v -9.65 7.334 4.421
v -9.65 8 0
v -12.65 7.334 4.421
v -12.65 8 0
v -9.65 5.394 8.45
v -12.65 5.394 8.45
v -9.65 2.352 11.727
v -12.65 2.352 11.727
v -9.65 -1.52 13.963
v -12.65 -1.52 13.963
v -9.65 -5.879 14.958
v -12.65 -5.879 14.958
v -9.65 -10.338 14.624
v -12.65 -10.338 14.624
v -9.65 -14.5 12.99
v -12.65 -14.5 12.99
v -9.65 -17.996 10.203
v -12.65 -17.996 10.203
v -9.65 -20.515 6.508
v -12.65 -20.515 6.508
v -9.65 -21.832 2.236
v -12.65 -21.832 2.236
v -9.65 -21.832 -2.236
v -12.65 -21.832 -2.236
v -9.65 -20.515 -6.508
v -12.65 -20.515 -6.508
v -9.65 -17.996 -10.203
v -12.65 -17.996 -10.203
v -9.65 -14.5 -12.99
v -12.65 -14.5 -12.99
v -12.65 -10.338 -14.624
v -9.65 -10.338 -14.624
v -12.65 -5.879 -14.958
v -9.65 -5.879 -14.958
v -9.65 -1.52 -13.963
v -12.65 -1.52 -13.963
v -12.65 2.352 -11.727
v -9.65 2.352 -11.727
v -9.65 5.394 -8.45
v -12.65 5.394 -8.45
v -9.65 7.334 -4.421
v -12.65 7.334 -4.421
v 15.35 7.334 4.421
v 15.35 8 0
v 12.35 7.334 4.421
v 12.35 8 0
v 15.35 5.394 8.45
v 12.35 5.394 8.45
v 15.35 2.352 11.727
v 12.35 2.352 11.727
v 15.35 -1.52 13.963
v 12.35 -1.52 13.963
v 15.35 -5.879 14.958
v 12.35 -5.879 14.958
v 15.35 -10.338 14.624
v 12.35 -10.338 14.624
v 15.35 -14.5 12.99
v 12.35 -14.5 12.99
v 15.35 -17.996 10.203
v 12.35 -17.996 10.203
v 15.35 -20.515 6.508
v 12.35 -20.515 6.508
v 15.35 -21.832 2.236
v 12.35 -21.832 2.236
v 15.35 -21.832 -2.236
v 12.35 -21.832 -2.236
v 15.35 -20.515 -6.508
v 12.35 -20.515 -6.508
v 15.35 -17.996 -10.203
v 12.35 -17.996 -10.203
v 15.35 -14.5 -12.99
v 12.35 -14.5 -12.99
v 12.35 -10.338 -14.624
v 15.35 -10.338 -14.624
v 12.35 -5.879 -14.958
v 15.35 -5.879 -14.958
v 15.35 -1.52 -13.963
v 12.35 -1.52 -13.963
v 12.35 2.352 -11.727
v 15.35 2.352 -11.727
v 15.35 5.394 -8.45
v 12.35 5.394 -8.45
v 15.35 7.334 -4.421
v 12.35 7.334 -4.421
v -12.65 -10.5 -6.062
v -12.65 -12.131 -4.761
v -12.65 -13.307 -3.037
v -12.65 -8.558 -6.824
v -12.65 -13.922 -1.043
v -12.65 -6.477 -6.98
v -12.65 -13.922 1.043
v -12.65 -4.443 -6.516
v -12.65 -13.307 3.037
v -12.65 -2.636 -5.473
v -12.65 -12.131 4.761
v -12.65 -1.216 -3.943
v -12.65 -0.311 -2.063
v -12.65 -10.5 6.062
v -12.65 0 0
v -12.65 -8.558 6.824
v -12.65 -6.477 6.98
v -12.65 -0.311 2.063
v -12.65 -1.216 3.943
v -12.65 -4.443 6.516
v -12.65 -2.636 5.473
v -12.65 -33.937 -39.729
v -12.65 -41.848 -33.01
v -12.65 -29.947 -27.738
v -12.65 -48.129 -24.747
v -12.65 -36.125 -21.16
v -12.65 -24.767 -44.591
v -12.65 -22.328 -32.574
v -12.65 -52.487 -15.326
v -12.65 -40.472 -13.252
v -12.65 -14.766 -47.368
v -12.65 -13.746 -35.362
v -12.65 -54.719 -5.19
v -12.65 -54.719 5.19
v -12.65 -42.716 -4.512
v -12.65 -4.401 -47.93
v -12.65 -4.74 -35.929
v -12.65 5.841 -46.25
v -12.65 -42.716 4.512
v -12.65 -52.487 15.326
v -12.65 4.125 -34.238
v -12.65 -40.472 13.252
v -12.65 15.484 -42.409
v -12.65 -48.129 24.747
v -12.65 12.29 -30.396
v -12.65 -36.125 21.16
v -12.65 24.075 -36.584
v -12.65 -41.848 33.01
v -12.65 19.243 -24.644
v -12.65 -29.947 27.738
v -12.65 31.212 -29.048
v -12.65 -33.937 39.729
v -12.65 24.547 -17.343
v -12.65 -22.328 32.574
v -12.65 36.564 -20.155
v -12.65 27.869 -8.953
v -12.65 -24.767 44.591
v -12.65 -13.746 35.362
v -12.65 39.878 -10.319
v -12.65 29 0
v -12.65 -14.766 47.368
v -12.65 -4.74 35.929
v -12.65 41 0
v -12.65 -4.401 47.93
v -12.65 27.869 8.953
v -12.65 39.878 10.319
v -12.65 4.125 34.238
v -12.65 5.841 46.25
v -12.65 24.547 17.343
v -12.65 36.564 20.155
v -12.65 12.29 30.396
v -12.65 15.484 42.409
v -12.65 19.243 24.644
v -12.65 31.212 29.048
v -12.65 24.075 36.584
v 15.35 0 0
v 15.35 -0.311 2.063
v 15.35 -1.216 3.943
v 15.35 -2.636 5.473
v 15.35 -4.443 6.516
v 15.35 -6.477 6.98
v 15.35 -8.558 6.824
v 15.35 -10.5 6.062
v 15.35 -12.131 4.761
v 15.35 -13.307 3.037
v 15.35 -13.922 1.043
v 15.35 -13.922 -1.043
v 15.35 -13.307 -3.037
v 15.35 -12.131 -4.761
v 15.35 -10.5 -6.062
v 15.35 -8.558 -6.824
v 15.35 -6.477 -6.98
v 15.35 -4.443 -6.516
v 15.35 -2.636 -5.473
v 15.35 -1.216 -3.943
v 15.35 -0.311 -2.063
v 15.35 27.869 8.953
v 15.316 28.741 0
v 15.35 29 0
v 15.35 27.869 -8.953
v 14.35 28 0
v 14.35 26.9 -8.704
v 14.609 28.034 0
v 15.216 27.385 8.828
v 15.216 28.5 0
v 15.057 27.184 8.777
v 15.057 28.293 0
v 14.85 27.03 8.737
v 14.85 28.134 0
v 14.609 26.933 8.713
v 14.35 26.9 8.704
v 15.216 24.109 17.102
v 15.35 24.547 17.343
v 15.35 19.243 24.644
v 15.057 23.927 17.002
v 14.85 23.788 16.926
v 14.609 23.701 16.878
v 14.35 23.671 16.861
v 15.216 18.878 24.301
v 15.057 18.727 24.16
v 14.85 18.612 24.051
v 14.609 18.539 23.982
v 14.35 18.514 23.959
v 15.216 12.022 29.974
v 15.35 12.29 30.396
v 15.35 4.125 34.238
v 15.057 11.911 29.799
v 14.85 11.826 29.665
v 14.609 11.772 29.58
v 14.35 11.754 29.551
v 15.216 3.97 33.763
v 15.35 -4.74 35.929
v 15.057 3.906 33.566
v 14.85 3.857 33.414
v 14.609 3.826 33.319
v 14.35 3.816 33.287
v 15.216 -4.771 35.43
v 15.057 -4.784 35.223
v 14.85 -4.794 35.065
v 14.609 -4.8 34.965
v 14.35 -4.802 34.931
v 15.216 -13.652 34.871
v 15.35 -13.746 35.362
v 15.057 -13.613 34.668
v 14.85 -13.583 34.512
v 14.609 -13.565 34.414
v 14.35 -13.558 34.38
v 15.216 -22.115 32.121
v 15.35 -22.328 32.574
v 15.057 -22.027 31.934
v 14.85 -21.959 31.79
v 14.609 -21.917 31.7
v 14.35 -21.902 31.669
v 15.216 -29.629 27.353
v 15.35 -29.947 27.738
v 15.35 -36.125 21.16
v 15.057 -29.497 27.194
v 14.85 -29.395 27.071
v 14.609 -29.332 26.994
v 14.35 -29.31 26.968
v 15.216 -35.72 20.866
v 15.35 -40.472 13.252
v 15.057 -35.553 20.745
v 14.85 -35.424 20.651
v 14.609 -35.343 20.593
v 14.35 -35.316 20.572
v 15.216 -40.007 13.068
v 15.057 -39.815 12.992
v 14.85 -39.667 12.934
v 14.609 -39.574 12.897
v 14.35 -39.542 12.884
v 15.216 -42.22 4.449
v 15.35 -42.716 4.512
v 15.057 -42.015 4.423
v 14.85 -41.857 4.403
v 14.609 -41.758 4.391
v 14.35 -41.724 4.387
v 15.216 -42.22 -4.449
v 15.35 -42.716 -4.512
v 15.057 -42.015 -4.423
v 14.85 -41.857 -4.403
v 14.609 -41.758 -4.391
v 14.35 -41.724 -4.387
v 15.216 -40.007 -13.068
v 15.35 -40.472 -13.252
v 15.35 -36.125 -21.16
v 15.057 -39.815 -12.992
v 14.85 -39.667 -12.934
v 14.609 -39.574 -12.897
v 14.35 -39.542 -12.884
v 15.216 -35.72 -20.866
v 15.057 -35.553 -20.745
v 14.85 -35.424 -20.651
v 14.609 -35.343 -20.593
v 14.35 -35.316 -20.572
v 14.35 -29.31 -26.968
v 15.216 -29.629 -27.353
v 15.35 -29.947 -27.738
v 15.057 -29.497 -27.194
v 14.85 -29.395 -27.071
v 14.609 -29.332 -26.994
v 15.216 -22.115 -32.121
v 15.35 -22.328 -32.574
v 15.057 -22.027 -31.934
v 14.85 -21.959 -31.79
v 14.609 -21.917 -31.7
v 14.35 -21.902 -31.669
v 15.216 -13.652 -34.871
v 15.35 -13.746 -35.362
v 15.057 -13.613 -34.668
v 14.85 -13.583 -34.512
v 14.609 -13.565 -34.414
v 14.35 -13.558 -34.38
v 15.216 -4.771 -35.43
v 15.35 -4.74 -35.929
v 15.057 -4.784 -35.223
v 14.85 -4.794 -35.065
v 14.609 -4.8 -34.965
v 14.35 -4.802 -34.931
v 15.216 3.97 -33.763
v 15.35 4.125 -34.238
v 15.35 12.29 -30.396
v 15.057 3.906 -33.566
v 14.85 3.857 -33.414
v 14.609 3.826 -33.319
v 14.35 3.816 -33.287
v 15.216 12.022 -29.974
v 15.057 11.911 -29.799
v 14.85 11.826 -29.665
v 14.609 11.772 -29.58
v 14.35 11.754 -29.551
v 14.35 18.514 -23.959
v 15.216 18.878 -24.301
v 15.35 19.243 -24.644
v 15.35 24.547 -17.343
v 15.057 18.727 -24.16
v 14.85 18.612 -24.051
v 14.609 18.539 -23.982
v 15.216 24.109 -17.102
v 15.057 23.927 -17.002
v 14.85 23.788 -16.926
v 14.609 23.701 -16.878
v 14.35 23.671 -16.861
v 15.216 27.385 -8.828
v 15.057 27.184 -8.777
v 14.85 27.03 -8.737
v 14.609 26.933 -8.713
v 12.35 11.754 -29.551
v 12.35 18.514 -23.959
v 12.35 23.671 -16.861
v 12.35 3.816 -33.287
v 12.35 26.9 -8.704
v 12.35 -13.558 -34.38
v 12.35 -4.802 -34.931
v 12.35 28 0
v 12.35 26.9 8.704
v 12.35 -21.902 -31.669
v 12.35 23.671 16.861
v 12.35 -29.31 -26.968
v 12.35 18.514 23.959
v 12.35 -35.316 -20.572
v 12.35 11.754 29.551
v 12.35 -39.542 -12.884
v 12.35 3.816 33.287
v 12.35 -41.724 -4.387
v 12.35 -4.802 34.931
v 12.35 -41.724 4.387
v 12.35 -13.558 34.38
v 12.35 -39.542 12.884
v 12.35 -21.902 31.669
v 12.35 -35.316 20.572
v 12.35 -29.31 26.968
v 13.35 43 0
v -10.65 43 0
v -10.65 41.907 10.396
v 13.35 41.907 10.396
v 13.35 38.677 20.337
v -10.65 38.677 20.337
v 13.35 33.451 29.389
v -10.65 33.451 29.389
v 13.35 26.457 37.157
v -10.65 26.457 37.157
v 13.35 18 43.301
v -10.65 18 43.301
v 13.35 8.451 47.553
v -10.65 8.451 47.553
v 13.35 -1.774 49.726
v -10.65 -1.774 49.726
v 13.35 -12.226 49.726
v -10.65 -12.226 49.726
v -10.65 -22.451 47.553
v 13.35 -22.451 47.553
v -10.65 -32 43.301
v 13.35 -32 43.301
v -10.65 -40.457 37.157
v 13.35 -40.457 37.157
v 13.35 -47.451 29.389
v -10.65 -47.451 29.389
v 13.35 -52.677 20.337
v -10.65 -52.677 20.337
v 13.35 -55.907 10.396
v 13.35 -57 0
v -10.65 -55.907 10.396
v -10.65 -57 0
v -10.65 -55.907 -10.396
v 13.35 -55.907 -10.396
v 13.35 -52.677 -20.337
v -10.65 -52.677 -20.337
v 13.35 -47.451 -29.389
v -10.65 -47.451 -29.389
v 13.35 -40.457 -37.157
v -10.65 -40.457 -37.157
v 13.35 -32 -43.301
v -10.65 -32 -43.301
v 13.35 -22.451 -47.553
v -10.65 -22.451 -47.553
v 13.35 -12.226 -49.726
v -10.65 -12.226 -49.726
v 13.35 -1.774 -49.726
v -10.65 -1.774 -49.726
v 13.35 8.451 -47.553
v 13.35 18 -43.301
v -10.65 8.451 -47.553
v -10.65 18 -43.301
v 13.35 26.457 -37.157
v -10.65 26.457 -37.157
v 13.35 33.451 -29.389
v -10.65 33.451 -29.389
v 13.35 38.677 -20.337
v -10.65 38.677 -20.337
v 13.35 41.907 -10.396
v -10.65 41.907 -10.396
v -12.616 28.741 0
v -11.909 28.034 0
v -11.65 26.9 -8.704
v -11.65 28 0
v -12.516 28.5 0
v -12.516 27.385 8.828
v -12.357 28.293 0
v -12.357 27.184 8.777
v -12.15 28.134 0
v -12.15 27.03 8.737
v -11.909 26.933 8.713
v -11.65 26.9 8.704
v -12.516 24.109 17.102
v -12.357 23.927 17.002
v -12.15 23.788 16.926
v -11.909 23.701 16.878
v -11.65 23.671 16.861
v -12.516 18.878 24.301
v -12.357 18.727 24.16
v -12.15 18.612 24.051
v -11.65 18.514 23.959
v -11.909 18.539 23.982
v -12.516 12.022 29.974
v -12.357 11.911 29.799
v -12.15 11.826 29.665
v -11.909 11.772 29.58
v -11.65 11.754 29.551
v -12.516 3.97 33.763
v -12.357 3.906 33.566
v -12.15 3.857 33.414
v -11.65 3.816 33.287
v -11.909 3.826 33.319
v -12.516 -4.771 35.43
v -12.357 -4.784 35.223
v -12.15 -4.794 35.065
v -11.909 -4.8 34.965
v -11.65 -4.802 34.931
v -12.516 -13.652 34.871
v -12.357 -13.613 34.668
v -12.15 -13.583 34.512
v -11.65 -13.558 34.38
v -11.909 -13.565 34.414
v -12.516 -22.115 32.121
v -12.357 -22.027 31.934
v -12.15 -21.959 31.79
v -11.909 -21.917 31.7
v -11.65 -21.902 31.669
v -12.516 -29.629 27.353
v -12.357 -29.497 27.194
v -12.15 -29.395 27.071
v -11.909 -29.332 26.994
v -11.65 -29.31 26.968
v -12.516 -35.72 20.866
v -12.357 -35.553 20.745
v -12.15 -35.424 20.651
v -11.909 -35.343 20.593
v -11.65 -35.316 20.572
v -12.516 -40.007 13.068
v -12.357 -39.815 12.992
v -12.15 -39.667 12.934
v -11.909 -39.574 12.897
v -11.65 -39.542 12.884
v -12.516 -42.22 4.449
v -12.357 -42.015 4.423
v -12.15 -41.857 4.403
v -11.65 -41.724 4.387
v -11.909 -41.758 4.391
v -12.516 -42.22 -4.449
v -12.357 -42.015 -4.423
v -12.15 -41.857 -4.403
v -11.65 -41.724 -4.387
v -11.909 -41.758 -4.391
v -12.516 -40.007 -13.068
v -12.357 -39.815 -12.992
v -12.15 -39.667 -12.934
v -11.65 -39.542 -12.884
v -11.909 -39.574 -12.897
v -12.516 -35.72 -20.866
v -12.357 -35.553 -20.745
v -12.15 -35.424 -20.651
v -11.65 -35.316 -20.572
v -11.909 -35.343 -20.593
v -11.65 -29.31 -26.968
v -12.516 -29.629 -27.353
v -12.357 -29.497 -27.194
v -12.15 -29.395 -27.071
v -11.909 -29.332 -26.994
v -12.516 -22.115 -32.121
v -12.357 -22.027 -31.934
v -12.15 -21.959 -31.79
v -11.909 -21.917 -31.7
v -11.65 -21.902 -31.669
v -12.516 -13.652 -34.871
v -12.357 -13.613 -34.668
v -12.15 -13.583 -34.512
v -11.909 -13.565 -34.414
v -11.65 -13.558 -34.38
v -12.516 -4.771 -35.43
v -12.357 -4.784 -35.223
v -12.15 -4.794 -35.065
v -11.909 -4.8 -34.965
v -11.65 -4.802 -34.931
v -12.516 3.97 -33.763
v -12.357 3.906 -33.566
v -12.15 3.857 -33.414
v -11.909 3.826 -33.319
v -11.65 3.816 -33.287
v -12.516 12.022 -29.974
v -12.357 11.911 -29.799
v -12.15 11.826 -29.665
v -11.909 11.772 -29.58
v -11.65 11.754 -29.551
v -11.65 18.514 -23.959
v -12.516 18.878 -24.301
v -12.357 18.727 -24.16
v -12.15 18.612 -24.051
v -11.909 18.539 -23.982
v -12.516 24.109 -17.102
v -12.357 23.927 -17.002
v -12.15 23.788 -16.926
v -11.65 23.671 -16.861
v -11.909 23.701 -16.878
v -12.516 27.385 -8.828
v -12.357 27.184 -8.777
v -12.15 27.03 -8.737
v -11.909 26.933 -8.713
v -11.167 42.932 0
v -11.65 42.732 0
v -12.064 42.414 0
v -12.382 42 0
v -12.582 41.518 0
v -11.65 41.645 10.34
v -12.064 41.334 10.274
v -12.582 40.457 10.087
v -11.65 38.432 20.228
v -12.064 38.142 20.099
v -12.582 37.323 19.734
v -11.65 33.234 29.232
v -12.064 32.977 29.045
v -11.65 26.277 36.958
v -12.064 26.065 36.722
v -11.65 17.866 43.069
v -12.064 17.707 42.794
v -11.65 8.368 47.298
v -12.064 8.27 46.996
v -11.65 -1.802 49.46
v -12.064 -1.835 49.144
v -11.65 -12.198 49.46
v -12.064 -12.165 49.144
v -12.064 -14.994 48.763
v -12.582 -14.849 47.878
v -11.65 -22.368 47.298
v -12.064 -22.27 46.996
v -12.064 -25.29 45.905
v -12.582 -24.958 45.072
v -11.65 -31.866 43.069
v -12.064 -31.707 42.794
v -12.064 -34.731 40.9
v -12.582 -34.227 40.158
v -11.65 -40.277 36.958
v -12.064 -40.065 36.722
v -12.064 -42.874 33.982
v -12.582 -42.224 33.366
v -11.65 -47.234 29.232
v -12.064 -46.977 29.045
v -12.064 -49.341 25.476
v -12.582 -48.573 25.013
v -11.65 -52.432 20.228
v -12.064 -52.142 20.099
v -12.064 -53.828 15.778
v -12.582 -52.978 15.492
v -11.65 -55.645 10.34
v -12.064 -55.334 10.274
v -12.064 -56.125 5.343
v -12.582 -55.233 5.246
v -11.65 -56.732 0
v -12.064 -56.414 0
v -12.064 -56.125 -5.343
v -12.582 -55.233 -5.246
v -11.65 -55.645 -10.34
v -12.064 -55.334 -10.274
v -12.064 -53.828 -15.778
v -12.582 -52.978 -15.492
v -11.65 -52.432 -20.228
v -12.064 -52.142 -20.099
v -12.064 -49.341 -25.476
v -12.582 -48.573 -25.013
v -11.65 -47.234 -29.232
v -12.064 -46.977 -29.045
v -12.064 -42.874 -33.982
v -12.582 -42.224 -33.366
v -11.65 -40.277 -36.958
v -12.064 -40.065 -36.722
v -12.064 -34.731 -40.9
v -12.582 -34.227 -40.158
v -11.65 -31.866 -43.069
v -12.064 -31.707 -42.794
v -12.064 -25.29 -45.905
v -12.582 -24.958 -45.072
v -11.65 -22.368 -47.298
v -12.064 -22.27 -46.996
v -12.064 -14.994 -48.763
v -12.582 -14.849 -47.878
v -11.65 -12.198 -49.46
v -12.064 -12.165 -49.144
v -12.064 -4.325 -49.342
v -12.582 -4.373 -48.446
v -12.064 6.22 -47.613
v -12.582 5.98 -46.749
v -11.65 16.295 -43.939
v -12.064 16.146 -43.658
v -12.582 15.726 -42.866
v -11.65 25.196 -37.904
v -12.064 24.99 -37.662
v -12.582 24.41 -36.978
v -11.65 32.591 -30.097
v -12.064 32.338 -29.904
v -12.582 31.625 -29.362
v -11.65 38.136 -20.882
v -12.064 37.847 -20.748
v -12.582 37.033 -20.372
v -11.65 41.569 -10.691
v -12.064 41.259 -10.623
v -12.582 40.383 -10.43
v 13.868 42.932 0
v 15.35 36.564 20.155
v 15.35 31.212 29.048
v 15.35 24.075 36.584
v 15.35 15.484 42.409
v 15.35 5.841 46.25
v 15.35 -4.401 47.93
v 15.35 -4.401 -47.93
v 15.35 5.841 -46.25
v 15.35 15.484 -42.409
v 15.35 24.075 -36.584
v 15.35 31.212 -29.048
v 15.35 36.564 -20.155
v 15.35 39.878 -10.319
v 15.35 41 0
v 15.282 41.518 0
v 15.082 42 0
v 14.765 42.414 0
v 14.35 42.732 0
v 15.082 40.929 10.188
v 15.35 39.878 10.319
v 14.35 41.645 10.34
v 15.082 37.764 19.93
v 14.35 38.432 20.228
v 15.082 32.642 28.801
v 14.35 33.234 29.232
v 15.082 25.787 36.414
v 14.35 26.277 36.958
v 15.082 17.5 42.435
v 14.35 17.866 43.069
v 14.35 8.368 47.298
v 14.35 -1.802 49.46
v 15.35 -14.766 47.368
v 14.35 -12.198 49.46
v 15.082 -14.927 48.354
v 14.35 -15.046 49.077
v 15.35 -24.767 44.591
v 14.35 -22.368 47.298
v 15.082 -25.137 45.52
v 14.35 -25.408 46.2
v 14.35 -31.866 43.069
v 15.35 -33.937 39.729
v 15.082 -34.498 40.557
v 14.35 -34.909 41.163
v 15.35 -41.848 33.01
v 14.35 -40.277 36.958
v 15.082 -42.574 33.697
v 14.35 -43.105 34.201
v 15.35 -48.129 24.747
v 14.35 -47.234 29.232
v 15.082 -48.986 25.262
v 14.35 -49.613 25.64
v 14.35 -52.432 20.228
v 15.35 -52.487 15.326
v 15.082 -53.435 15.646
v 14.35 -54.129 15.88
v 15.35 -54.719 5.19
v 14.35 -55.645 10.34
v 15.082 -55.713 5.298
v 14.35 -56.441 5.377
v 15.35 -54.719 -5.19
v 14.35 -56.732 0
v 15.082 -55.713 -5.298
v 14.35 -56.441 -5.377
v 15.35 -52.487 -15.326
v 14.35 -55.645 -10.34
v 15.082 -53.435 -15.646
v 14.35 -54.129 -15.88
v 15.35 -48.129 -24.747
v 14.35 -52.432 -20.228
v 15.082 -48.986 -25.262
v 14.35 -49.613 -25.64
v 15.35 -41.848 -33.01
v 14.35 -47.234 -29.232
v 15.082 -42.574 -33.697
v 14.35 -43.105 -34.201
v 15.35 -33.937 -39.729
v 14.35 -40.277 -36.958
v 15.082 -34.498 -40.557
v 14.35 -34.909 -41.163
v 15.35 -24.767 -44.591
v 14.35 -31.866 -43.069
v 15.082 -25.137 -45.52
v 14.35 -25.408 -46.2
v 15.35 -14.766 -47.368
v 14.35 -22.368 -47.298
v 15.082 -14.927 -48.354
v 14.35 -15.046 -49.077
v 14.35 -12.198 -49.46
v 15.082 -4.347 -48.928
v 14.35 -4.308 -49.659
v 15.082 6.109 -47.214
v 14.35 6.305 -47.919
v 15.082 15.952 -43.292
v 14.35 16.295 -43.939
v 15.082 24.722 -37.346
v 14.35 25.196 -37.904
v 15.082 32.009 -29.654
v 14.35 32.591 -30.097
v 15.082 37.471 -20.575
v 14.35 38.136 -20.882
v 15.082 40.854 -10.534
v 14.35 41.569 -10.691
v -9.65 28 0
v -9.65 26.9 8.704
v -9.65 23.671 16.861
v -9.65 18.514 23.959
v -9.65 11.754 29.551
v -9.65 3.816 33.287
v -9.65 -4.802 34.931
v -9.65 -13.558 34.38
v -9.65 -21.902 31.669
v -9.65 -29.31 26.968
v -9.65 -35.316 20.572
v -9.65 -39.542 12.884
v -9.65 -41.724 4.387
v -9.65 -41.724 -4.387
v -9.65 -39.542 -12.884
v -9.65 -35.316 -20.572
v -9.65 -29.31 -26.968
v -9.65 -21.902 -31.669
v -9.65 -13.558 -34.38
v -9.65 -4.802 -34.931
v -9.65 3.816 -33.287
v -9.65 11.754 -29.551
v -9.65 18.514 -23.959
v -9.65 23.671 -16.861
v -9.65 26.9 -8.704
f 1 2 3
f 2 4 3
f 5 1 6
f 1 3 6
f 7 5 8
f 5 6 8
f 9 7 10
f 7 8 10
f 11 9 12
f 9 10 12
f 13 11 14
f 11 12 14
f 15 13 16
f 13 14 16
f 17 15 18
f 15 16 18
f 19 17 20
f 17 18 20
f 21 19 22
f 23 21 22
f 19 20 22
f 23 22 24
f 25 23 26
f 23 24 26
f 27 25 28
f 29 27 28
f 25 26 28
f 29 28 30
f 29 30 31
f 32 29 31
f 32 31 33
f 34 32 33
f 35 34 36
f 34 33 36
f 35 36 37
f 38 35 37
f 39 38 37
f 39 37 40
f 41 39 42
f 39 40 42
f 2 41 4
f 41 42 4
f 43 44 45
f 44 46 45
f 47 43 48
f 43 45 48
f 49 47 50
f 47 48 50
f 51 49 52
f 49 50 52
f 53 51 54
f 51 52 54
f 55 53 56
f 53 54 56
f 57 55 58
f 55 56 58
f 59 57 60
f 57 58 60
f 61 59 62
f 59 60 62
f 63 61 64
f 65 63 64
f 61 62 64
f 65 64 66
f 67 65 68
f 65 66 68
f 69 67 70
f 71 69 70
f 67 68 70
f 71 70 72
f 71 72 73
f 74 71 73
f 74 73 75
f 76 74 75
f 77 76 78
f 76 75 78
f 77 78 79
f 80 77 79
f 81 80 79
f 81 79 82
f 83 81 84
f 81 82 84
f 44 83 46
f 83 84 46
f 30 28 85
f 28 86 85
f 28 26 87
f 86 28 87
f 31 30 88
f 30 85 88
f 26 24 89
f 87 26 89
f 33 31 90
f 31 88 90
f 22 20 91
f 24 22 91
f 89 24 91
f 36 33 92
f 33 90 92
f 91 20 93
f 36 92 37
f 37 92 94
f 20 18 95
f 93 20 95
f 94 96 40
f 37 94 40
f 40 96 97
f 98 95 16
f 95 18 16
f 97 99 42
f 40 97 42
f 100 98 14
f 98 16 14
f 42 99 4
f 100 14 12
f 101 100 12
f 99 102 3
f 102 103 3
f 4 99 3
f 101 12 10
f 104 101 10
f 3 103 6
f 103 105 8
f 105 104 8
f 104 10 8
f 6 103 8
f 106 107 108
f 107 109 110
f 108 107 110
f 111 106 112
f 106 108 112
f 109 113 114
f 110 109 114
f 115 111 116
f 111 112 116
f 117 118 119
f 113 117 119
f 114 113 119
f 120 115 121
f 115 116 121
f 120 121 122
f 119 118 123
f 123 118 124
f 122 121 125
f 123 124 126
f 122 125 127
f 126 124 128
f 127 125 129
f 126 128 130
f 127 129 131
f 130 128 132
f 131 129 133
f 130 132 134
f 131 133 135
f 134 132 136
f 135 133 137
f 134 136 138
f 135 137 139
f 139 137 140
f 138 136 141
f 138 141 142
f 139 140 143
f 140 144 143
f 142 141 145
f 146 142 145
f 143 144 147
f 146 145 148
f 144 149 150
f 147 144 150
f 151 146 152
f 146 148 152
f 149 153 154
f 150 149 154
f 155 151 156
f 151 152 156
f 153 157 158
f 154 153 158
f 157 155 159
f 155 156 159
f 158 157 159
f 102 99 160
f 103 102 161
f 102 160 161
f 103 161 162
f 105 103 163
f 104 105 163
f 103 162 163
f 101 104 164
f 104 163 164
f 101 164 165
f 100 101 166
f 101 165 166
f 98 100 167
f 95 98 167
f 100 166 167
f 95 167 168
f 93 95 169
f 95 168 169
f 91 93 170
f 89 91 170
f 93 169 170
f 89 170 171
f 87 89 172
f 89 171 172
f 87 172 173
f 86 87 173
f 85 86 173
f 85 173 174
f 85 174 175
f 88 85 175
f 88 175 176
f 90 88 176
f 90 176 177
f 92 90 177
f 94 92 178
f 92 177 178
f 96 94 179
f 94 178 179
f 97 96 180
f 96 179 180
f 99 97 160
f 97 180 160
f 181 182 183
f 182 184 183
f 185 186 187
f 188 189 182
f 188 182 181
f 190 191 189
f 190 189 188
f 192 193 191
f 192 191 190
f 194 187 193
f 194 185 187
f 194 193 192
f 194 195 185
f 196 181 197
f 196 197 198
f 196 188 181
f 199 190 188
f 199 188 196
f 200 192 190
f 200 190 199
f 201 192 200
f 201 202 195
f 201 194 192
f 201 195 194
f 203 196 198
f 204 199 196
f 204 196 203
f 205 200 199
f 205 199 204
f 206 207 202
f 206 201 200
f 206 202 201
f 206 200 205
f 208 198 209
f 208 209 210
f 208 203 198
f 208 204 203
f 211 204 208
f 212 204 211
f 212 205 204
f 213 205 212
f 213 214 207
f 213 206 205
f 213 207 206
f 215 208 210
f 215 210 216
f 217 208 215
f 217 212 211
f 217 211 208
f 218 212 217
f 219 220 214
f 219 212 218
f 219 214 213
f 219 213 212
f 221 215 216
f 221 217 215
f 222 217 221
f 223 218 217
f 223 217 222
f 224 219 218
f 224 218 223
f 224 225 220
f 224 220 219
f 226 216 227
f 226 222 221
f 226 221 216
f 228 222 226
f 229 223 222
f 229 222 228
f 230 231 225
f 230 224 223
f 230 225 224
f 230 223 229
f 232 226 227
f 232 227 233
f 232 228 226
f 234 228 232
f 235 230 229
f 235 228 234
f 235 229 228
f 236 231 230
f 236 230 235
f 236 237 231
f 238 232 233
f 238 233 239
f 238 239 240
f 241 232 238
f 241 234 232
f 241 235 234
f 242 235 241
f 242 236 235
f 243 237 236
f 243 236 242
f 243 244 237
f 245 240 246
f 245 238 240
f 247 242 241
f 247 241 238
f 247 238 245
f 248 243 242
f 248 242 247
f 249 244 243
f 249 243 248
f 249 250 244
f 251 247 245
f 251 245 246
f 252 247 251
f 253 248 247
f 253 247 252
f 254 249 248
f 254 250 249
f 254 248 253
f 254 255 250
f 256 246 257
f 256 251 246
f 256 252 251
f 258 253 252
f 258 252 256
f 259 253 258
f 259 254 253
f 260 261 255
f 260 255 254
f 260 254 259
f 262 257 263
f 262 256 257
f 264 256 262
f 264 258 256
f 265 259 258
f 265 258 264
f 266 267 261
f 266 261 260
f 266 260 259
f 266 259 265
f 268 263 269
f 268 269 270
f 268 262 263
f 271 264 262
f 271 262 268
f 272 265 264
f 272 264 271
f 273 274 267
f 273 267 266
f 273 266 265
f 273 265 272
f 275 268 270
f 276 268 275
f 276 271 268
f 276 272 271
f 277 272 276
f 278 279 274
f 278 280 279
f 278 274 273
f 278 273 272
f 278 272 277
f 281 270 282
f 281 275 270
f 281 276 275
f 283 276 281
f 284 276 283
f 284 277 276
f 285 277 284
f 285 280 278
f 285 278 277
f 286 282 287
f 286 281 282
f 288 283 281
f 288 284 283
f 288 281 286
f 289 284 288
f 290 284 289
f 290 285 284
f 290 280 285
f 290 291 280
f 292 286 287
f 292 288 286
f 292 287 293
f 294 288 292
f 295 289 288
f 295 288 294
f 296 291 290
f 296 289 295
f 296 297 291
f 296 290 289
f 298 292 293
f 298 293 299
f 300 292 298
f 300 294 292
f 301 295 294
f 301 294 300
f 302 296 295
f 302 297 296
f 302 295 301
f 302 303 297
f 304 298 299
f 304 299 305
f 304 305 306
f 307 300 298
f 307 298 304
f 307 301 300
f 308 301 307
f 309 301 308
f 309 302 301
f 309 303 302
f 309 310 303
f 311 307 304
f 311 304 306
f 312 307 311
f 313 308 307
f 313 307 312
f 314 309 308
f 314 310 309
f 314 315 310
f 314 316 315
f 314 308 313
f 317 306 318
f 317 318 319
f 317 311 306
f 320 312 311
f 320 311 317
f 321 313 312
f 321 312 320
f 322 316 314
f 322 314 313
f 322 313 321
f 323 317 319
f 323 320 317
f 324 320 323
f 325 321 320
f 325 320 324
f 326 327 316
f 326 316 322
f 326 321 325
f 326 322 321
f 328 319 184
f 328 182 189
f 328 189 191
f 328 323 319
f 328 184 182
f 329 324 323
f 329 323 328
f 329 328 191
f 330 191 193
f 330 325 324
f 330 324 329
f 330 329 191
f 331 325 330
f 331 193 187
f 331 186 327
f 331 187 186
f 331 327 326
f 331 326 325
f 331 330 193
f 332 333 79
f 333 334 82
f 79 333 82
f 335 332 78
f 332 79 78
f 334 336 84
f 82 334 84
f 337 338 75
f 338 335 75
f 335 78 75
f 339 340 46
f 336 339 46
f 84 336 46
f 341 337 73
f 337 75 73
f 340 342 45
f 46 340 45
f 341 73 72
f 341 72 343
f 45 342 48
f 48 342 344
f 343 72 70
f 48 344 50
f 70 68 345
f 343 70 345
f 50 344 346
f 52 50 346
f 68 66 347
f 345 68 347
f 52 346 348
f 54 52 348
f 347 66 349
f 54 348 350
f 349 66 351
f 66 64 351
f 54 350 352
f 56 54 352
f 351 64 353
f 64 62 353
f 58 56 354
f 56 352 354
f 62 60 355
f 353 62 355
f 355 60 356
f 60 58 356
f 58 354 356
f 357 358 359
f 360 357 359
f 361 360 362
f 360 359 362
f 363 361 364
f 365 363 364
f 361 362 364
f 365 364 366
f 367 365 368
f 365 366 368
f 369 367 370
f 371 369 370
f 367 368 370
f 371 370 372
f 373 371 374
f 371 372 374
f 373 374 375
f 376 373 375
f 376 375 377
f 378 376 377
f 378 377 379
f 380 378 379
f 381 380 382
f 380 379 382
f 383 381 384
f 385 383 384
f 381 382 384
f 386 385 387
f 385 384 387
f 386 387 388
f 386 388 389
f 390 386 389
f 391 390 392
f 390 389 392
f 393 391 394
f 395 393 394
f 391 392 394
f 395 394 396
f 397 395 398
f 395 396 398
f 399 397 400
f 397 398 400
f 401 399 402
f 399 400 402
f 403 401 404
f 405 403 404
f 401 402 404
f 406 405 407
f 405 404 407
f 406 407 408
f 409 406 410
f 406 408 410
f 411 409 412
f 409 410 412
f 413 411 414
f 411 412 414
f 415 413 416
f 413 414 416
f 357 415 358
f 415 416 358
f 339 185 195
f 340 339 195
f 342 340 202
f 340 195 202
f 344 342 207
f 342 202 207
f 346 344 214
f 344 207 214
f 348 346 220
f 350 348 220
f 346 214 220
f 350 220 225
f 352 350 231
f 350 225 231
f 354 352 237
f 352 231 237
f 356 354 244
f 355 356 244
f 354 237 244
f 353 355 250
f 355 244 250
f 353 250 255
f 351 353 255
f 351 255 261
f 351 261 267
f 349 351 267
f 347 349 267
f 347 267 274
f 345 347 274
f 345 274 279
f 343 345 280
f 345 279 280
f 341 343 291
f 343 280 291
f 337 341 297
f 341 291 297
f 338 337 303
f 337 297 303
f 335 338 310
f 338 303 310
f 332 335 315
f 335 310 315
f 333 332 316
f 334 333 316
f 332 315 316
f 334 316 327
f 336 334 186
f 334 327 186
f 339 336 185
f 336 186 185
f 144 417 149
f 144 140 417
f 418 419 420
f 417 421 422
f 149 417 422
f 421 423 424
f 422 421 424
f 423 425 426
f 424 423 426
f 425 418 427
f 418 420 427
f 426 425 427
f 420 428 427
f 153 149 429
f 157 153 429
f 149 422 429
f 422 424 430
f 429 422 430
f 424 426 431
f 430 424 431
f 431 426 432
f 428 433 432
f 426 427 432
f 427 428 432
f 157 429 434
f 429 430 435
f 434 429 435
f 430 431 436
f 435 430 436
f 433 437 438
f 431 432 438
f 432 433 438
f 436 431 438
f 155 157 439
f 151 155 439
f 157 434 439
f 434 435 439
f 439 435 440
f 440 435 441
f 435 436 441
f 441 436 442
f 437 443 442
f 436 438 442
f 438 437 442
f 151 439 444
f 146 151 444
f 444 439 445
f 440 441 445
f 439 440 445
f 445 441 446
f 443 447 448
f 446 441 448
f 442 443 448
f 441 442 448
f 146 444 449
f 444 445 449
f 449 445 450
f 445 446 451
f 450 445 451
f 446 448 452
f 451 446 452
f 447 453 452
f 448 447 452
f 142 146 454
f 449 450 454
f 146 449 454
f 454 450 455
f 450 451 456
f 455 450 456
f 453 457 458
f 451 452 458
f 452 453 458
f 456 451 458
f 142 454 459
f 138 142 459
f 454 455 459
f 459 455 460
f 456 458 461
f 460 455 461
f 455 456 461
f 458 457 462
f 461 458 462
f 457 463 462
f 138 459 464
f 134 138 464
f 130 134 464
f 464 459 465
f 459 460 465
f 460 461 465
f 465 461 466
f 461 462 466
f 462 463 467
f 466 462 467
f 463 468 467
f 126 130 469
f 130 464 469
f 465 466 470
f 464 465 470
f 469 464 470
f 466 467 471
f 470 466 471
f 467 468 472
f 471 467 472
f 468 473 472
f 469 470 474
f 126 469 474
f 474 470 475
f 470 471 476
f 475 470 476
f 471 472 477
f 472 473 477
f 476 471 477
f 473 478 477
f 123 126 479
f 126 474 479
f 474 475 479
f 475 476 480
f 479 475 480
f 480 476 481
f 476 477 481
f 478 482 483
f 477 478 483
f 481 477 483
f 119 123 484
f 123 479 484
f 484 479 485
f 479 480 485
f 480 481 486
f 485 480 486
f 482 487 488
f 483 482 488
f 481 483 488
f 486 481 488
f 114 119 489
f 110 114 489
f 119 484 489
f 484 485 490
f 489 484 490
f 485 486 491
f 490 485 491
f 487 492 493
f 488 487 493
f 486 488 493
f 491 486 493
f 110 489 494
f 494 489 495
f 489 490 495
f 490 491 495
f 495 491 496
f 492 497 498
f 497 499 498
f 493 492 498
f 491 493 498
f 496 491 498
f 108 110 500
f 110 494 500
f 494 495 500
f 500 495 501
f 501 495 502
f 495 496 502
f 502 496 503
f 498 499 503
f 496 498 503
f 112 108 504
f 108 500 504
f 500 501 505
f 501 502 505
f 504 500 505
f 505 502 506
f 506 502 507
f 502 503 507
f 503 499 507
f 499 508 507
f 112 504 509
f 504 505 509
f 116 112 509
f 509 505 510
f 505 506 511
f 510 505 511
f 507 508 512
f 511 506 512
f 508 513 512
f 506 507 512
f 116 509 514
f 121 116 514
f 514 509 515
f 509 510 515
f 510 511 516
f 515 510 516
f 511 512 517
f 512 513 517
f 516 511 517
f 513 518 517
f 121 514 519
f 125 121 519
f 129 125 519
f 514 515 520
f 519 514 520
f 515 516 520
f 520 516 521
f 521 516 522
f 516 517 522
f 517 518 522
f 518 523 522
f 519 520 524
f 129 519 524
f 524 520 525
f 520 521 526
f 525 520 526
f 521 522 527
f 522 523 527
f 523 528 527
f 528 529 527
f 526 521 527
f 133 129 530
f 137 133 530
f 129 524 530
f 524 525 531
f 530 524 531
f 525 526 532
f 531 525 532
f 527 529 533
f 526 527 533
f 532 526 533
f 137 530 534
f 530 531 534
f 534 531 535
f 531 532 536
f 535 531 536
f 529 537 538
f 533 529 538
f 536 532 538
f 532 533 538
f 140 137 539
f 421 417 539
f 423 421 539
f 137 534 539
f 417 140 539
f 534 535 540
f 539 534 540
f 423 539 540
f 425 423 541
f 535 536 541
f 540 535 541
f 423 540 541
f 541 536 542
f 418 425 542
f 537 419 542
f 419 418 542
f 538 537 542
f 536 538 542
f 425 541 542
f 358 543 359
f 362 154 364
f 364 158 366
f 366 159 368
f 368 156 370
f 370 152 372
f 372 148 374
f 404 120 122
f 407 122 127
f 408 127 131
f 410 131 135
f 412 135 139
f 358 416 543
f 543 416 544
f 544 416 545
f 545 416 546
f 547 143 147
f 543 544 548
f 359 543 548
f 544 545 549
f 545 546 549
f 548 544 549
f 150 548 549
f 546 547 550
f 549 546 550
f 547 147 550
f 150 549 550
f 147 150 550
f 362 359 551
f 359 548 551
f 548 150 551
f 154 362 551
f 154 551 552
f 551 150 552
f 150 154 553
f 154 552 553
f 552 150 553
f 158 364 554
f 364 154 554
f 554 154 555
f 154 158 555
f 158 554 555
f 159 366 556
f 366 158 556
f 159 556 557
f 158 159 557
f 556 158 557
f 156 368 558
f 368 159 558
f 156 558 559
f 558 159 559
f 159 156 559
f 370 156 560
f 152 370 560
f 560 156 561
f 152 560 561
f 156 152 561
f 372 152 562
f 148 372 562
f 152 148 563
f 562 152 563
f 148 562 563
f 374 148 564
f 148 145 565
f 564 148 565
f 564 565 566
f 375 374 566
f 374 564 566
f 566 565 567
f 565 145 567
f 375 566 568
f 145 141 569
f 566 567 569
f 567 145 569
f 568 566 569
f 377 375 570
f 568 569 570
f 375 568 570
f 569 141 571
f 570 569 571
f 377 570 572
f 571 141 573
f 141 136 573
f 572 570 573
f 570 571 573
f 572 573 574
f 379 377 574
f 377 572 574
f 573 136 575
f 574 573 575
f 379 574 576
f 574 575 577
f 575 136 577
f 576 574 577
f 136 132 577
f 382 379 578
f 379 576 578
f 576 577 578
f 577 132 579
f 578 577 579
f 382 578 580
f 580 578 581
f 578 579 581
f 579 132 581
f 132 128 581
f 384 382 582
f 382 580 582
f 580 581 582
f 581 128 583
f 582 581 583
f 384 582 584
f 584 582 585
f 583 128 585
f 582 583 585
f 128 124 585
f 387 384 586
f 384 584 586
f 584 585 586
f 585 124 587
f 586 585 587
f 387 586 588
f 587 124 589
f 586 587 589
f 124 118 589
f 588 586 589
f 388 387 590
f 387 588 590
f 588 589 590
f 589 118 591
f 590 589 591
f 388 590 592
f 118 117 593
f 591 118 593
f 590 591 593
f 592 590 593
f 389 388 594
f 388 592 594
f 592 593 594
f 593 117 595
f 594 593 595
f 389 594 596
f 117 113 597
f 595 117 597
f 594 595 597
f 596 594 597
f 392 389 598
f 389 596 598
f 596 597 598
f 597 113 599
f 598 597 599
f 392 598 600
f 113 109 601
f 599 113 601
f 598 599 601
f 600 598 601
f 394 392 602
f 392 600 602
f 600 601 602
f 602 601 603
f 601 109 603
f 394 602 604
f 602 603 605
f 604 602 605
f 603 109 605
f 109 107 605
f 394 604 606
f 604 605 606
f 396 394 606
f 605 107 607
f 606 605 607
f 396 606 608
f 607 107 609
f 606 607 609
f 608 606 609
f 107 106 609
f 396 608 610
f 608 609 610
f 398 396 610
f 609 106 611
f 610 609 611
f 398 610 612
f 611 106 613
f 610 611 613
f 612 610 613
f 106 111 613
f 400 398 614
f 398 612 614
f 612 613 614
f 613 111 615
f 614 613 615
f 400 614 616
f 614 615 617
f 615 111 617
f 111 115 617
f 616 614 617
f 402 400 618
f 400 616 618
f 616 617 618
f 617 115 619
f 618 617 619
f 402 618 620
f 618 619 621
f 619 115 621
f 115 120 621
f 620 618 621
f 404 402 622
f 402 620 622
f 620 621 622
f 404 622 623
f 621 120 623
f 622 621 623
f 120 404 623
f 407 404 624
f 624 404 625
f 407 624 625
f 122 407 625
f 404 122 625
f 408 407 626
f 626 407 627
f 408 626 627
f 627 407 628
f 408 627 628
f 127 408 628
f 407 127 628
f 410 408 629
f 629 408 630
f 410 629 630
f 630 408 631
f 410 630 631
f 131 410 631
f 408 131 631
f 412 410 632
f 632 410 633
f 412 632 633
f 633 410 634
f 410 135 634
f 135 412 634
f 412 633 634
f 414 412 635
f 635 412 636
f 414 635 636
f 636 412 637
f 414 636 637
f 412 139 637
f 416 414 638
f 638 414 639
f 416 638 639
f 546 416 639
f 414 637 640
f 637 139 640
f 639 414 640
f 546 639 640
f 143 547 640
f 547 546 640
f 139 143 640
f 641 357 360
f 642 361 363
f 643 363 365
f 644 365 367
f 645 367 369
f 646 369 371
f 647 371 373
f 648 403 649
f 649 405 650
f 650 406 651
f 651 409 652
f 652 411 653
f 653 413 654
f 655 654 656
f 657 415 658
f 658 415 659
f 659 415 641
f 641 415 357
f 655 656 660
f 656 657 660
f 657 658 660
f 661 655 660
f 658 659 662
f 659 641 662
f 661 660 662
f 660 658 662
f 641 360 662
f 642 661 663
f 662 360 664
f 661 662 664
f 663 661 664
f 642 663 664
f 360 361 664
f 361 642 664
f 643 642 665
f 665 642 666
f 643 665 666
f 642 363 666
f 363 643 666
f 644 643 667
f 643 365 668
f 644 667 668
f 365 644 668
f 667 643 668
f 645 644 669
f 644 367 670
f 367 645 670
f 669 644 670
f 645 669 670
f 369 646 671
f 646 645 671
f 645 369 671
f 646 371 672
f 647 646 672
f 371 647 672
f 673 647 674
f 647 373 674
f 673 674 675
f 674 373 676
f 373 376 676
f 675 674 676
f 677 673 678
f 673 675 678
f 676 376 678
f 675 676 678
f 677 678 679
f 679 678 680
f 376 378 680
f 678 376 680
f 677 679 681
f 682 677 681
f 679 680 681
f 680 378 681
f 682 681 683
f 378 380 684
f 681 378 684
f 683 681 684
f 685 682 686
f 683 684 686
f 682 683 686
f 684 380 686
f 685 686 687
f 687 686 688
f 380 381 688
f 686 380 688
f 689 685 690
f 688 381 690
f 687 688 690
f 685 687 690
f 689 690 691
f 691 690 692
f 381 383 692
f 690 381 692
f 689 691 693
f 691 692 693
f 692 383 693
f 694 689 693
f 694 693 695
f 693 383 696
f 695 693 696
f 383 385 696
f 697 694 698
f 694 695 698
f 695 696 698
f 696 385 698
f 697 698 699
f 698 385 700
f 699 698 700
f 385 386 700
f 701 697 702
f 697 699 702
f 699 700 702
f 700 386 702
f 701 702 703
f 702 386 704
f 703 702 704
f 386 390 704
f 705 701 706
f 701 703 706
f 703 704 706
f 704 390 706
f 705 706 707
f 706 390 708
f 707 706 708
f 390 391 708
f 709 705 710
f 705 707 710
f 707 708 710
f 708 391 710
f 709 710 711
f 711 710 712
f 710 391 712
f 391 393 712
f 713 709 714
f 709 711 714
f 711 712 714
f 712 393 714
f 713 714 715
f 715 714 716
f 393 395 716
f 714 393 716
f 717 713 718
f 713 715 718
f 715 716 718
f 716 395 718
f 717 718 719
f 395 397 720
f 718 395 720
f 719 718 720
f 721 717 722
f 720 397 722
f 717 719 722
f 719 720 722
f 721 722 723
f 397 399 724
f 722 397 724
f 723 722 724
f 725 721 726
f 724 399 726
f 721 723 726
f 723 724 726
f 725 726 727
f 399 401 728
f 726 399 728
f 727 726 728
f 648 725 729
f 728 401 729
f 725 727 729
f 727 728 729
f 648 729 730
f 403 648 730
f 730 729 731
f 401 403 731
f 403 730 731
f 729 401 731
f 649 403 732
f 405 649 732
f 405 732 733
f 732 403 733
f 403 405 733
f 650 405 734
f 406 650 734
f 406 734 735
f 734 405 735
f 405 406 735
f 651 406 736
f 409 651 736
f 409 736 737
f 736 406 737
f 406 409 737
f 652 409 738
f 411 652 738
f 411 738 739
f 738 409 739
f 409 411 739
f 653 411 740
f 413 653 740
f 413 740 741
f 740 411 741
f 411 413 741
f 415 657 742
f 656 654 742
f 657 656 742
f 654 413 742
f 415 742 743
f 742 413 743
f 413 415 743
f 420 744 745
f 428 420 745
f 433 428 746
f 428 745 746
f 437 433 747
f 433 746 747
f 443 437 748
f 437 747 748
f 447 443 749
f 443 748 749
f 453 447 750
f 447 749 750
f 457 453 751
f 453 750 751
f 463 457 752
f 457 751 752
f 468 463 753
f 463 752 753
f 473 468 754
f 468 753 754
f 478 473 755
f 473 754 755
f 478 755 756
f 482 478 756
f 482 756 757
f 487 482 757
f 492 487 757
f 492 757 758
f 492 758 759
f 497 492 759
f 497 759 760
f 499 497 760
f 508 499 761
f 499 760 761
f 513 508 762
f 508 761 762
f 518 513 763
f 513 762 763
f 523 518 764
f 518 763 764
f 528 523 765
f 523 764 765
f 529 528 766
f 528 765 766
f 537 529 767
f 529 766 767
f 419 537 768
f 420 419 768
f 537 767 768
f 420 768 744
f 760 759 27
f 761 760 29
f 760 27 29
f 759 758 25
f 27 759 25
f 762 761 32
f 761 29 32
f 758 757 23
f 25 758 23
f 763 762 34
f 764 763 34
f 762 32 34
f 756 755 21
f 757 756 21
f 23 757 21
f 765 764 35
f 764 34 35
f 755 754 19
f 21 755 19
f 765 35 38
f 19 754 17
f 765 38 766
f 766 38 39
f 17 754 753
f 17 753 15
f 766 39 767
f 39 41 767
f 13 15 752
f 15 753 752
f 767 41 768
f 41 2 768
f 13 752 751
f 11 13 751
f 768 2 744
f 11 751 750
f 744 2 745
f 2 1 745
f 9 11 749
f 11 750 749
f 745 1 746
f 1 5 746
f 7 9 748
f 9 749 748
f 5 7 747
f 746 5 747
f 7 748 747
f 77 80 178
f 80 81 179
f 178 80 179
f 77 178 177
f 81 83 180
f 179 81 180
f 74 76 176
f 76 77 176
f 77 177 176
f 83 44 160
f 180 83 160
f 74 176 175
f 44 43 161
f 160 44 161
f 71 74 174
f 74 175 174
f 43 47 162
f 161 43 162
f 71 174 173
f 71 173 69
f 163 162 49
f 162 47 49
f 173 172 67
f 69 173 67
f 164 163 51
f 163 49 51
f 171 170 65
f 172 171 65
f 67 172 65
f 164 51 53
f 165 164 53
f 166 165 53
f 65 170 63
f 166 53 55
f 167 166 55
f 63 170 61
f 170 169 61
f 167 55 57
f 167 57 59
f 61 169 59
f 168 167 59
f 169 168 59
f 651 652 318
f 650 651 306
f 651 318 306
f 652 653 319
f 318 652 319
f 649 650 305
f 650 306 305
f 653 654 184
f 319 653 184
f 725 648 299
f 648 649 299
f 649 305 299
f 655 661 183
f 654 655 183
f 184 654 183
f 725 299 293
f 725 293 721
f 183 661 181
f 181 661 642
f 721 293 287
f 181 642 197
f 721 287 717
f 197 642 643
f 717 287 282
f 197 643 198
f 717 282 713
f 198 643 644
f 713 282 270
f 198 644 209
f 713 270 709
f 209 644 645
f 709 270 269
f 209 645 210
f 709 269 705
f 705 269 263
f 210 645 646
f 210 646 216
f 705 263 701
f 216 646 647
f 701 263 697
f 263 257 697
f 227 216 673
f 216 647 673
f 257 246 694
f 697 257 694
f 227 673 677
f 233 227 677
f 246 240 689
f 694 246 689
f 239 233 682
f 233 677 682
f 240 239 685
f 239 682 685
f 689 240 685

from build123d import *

# Parameters (mm, degrees)
REDONDEO1_R = 2
REDONDEO2_R = 2
REDONDEO3_R = 1
REDONDEO4_R = 1


with BuildPart() as part:
    # Croquis1 → Revolución1 (revolve)
    with BuildSketch(Plane.XY):
        Polygon((-12.649708752, 0), (15.350291248, 0), (15.350291248, 8), (12.350291248, 8), (12.350291248, 28), (15.350291248, 28), (15.350291248, 43), (-12.649708752, 43), (-12.649708752, 28), (-9.649708752, 28), (-9.649708752, 8), (-12.649708752, 8), align=None)
    revolve(axis=Axis((-30.163665743, -7, 0), (1, 0, 0)))

    # Redondeo1
    redondeo1_edges = [part.edges().sort_by_distance(p)[0] for p in [
        (15.350291248, -57, 0),
    ]]
    fillet(redondeo1_edges, radius=REDONDEO1_R)

    # Redondeo2
    redondeo2_edges = [part.edges().sort_by_distance(p)[0] for p in [
        (-12.649708752, -57, 0),
    ]]
    fillet(redondeo2_edges, radius=REDONDEO2_R)

    # Redondeo3
    redondeo3_edges = [part.edges().sort_by_distance(p)[0] for p in [
        (-12.649708752, -42, 0),
    ]]
    fillet(redondeo3_edges, radius=REDONDEO3_R)

    # Redondeo4
    redondeo4_edges = [part.edges().sort_by_distance(p)[0] for p in [
        (15.350291248, -42, 0),
    ]]
    fillet(redondeo4_edges, radius=REDONDEO4_R)


solid = part.part
